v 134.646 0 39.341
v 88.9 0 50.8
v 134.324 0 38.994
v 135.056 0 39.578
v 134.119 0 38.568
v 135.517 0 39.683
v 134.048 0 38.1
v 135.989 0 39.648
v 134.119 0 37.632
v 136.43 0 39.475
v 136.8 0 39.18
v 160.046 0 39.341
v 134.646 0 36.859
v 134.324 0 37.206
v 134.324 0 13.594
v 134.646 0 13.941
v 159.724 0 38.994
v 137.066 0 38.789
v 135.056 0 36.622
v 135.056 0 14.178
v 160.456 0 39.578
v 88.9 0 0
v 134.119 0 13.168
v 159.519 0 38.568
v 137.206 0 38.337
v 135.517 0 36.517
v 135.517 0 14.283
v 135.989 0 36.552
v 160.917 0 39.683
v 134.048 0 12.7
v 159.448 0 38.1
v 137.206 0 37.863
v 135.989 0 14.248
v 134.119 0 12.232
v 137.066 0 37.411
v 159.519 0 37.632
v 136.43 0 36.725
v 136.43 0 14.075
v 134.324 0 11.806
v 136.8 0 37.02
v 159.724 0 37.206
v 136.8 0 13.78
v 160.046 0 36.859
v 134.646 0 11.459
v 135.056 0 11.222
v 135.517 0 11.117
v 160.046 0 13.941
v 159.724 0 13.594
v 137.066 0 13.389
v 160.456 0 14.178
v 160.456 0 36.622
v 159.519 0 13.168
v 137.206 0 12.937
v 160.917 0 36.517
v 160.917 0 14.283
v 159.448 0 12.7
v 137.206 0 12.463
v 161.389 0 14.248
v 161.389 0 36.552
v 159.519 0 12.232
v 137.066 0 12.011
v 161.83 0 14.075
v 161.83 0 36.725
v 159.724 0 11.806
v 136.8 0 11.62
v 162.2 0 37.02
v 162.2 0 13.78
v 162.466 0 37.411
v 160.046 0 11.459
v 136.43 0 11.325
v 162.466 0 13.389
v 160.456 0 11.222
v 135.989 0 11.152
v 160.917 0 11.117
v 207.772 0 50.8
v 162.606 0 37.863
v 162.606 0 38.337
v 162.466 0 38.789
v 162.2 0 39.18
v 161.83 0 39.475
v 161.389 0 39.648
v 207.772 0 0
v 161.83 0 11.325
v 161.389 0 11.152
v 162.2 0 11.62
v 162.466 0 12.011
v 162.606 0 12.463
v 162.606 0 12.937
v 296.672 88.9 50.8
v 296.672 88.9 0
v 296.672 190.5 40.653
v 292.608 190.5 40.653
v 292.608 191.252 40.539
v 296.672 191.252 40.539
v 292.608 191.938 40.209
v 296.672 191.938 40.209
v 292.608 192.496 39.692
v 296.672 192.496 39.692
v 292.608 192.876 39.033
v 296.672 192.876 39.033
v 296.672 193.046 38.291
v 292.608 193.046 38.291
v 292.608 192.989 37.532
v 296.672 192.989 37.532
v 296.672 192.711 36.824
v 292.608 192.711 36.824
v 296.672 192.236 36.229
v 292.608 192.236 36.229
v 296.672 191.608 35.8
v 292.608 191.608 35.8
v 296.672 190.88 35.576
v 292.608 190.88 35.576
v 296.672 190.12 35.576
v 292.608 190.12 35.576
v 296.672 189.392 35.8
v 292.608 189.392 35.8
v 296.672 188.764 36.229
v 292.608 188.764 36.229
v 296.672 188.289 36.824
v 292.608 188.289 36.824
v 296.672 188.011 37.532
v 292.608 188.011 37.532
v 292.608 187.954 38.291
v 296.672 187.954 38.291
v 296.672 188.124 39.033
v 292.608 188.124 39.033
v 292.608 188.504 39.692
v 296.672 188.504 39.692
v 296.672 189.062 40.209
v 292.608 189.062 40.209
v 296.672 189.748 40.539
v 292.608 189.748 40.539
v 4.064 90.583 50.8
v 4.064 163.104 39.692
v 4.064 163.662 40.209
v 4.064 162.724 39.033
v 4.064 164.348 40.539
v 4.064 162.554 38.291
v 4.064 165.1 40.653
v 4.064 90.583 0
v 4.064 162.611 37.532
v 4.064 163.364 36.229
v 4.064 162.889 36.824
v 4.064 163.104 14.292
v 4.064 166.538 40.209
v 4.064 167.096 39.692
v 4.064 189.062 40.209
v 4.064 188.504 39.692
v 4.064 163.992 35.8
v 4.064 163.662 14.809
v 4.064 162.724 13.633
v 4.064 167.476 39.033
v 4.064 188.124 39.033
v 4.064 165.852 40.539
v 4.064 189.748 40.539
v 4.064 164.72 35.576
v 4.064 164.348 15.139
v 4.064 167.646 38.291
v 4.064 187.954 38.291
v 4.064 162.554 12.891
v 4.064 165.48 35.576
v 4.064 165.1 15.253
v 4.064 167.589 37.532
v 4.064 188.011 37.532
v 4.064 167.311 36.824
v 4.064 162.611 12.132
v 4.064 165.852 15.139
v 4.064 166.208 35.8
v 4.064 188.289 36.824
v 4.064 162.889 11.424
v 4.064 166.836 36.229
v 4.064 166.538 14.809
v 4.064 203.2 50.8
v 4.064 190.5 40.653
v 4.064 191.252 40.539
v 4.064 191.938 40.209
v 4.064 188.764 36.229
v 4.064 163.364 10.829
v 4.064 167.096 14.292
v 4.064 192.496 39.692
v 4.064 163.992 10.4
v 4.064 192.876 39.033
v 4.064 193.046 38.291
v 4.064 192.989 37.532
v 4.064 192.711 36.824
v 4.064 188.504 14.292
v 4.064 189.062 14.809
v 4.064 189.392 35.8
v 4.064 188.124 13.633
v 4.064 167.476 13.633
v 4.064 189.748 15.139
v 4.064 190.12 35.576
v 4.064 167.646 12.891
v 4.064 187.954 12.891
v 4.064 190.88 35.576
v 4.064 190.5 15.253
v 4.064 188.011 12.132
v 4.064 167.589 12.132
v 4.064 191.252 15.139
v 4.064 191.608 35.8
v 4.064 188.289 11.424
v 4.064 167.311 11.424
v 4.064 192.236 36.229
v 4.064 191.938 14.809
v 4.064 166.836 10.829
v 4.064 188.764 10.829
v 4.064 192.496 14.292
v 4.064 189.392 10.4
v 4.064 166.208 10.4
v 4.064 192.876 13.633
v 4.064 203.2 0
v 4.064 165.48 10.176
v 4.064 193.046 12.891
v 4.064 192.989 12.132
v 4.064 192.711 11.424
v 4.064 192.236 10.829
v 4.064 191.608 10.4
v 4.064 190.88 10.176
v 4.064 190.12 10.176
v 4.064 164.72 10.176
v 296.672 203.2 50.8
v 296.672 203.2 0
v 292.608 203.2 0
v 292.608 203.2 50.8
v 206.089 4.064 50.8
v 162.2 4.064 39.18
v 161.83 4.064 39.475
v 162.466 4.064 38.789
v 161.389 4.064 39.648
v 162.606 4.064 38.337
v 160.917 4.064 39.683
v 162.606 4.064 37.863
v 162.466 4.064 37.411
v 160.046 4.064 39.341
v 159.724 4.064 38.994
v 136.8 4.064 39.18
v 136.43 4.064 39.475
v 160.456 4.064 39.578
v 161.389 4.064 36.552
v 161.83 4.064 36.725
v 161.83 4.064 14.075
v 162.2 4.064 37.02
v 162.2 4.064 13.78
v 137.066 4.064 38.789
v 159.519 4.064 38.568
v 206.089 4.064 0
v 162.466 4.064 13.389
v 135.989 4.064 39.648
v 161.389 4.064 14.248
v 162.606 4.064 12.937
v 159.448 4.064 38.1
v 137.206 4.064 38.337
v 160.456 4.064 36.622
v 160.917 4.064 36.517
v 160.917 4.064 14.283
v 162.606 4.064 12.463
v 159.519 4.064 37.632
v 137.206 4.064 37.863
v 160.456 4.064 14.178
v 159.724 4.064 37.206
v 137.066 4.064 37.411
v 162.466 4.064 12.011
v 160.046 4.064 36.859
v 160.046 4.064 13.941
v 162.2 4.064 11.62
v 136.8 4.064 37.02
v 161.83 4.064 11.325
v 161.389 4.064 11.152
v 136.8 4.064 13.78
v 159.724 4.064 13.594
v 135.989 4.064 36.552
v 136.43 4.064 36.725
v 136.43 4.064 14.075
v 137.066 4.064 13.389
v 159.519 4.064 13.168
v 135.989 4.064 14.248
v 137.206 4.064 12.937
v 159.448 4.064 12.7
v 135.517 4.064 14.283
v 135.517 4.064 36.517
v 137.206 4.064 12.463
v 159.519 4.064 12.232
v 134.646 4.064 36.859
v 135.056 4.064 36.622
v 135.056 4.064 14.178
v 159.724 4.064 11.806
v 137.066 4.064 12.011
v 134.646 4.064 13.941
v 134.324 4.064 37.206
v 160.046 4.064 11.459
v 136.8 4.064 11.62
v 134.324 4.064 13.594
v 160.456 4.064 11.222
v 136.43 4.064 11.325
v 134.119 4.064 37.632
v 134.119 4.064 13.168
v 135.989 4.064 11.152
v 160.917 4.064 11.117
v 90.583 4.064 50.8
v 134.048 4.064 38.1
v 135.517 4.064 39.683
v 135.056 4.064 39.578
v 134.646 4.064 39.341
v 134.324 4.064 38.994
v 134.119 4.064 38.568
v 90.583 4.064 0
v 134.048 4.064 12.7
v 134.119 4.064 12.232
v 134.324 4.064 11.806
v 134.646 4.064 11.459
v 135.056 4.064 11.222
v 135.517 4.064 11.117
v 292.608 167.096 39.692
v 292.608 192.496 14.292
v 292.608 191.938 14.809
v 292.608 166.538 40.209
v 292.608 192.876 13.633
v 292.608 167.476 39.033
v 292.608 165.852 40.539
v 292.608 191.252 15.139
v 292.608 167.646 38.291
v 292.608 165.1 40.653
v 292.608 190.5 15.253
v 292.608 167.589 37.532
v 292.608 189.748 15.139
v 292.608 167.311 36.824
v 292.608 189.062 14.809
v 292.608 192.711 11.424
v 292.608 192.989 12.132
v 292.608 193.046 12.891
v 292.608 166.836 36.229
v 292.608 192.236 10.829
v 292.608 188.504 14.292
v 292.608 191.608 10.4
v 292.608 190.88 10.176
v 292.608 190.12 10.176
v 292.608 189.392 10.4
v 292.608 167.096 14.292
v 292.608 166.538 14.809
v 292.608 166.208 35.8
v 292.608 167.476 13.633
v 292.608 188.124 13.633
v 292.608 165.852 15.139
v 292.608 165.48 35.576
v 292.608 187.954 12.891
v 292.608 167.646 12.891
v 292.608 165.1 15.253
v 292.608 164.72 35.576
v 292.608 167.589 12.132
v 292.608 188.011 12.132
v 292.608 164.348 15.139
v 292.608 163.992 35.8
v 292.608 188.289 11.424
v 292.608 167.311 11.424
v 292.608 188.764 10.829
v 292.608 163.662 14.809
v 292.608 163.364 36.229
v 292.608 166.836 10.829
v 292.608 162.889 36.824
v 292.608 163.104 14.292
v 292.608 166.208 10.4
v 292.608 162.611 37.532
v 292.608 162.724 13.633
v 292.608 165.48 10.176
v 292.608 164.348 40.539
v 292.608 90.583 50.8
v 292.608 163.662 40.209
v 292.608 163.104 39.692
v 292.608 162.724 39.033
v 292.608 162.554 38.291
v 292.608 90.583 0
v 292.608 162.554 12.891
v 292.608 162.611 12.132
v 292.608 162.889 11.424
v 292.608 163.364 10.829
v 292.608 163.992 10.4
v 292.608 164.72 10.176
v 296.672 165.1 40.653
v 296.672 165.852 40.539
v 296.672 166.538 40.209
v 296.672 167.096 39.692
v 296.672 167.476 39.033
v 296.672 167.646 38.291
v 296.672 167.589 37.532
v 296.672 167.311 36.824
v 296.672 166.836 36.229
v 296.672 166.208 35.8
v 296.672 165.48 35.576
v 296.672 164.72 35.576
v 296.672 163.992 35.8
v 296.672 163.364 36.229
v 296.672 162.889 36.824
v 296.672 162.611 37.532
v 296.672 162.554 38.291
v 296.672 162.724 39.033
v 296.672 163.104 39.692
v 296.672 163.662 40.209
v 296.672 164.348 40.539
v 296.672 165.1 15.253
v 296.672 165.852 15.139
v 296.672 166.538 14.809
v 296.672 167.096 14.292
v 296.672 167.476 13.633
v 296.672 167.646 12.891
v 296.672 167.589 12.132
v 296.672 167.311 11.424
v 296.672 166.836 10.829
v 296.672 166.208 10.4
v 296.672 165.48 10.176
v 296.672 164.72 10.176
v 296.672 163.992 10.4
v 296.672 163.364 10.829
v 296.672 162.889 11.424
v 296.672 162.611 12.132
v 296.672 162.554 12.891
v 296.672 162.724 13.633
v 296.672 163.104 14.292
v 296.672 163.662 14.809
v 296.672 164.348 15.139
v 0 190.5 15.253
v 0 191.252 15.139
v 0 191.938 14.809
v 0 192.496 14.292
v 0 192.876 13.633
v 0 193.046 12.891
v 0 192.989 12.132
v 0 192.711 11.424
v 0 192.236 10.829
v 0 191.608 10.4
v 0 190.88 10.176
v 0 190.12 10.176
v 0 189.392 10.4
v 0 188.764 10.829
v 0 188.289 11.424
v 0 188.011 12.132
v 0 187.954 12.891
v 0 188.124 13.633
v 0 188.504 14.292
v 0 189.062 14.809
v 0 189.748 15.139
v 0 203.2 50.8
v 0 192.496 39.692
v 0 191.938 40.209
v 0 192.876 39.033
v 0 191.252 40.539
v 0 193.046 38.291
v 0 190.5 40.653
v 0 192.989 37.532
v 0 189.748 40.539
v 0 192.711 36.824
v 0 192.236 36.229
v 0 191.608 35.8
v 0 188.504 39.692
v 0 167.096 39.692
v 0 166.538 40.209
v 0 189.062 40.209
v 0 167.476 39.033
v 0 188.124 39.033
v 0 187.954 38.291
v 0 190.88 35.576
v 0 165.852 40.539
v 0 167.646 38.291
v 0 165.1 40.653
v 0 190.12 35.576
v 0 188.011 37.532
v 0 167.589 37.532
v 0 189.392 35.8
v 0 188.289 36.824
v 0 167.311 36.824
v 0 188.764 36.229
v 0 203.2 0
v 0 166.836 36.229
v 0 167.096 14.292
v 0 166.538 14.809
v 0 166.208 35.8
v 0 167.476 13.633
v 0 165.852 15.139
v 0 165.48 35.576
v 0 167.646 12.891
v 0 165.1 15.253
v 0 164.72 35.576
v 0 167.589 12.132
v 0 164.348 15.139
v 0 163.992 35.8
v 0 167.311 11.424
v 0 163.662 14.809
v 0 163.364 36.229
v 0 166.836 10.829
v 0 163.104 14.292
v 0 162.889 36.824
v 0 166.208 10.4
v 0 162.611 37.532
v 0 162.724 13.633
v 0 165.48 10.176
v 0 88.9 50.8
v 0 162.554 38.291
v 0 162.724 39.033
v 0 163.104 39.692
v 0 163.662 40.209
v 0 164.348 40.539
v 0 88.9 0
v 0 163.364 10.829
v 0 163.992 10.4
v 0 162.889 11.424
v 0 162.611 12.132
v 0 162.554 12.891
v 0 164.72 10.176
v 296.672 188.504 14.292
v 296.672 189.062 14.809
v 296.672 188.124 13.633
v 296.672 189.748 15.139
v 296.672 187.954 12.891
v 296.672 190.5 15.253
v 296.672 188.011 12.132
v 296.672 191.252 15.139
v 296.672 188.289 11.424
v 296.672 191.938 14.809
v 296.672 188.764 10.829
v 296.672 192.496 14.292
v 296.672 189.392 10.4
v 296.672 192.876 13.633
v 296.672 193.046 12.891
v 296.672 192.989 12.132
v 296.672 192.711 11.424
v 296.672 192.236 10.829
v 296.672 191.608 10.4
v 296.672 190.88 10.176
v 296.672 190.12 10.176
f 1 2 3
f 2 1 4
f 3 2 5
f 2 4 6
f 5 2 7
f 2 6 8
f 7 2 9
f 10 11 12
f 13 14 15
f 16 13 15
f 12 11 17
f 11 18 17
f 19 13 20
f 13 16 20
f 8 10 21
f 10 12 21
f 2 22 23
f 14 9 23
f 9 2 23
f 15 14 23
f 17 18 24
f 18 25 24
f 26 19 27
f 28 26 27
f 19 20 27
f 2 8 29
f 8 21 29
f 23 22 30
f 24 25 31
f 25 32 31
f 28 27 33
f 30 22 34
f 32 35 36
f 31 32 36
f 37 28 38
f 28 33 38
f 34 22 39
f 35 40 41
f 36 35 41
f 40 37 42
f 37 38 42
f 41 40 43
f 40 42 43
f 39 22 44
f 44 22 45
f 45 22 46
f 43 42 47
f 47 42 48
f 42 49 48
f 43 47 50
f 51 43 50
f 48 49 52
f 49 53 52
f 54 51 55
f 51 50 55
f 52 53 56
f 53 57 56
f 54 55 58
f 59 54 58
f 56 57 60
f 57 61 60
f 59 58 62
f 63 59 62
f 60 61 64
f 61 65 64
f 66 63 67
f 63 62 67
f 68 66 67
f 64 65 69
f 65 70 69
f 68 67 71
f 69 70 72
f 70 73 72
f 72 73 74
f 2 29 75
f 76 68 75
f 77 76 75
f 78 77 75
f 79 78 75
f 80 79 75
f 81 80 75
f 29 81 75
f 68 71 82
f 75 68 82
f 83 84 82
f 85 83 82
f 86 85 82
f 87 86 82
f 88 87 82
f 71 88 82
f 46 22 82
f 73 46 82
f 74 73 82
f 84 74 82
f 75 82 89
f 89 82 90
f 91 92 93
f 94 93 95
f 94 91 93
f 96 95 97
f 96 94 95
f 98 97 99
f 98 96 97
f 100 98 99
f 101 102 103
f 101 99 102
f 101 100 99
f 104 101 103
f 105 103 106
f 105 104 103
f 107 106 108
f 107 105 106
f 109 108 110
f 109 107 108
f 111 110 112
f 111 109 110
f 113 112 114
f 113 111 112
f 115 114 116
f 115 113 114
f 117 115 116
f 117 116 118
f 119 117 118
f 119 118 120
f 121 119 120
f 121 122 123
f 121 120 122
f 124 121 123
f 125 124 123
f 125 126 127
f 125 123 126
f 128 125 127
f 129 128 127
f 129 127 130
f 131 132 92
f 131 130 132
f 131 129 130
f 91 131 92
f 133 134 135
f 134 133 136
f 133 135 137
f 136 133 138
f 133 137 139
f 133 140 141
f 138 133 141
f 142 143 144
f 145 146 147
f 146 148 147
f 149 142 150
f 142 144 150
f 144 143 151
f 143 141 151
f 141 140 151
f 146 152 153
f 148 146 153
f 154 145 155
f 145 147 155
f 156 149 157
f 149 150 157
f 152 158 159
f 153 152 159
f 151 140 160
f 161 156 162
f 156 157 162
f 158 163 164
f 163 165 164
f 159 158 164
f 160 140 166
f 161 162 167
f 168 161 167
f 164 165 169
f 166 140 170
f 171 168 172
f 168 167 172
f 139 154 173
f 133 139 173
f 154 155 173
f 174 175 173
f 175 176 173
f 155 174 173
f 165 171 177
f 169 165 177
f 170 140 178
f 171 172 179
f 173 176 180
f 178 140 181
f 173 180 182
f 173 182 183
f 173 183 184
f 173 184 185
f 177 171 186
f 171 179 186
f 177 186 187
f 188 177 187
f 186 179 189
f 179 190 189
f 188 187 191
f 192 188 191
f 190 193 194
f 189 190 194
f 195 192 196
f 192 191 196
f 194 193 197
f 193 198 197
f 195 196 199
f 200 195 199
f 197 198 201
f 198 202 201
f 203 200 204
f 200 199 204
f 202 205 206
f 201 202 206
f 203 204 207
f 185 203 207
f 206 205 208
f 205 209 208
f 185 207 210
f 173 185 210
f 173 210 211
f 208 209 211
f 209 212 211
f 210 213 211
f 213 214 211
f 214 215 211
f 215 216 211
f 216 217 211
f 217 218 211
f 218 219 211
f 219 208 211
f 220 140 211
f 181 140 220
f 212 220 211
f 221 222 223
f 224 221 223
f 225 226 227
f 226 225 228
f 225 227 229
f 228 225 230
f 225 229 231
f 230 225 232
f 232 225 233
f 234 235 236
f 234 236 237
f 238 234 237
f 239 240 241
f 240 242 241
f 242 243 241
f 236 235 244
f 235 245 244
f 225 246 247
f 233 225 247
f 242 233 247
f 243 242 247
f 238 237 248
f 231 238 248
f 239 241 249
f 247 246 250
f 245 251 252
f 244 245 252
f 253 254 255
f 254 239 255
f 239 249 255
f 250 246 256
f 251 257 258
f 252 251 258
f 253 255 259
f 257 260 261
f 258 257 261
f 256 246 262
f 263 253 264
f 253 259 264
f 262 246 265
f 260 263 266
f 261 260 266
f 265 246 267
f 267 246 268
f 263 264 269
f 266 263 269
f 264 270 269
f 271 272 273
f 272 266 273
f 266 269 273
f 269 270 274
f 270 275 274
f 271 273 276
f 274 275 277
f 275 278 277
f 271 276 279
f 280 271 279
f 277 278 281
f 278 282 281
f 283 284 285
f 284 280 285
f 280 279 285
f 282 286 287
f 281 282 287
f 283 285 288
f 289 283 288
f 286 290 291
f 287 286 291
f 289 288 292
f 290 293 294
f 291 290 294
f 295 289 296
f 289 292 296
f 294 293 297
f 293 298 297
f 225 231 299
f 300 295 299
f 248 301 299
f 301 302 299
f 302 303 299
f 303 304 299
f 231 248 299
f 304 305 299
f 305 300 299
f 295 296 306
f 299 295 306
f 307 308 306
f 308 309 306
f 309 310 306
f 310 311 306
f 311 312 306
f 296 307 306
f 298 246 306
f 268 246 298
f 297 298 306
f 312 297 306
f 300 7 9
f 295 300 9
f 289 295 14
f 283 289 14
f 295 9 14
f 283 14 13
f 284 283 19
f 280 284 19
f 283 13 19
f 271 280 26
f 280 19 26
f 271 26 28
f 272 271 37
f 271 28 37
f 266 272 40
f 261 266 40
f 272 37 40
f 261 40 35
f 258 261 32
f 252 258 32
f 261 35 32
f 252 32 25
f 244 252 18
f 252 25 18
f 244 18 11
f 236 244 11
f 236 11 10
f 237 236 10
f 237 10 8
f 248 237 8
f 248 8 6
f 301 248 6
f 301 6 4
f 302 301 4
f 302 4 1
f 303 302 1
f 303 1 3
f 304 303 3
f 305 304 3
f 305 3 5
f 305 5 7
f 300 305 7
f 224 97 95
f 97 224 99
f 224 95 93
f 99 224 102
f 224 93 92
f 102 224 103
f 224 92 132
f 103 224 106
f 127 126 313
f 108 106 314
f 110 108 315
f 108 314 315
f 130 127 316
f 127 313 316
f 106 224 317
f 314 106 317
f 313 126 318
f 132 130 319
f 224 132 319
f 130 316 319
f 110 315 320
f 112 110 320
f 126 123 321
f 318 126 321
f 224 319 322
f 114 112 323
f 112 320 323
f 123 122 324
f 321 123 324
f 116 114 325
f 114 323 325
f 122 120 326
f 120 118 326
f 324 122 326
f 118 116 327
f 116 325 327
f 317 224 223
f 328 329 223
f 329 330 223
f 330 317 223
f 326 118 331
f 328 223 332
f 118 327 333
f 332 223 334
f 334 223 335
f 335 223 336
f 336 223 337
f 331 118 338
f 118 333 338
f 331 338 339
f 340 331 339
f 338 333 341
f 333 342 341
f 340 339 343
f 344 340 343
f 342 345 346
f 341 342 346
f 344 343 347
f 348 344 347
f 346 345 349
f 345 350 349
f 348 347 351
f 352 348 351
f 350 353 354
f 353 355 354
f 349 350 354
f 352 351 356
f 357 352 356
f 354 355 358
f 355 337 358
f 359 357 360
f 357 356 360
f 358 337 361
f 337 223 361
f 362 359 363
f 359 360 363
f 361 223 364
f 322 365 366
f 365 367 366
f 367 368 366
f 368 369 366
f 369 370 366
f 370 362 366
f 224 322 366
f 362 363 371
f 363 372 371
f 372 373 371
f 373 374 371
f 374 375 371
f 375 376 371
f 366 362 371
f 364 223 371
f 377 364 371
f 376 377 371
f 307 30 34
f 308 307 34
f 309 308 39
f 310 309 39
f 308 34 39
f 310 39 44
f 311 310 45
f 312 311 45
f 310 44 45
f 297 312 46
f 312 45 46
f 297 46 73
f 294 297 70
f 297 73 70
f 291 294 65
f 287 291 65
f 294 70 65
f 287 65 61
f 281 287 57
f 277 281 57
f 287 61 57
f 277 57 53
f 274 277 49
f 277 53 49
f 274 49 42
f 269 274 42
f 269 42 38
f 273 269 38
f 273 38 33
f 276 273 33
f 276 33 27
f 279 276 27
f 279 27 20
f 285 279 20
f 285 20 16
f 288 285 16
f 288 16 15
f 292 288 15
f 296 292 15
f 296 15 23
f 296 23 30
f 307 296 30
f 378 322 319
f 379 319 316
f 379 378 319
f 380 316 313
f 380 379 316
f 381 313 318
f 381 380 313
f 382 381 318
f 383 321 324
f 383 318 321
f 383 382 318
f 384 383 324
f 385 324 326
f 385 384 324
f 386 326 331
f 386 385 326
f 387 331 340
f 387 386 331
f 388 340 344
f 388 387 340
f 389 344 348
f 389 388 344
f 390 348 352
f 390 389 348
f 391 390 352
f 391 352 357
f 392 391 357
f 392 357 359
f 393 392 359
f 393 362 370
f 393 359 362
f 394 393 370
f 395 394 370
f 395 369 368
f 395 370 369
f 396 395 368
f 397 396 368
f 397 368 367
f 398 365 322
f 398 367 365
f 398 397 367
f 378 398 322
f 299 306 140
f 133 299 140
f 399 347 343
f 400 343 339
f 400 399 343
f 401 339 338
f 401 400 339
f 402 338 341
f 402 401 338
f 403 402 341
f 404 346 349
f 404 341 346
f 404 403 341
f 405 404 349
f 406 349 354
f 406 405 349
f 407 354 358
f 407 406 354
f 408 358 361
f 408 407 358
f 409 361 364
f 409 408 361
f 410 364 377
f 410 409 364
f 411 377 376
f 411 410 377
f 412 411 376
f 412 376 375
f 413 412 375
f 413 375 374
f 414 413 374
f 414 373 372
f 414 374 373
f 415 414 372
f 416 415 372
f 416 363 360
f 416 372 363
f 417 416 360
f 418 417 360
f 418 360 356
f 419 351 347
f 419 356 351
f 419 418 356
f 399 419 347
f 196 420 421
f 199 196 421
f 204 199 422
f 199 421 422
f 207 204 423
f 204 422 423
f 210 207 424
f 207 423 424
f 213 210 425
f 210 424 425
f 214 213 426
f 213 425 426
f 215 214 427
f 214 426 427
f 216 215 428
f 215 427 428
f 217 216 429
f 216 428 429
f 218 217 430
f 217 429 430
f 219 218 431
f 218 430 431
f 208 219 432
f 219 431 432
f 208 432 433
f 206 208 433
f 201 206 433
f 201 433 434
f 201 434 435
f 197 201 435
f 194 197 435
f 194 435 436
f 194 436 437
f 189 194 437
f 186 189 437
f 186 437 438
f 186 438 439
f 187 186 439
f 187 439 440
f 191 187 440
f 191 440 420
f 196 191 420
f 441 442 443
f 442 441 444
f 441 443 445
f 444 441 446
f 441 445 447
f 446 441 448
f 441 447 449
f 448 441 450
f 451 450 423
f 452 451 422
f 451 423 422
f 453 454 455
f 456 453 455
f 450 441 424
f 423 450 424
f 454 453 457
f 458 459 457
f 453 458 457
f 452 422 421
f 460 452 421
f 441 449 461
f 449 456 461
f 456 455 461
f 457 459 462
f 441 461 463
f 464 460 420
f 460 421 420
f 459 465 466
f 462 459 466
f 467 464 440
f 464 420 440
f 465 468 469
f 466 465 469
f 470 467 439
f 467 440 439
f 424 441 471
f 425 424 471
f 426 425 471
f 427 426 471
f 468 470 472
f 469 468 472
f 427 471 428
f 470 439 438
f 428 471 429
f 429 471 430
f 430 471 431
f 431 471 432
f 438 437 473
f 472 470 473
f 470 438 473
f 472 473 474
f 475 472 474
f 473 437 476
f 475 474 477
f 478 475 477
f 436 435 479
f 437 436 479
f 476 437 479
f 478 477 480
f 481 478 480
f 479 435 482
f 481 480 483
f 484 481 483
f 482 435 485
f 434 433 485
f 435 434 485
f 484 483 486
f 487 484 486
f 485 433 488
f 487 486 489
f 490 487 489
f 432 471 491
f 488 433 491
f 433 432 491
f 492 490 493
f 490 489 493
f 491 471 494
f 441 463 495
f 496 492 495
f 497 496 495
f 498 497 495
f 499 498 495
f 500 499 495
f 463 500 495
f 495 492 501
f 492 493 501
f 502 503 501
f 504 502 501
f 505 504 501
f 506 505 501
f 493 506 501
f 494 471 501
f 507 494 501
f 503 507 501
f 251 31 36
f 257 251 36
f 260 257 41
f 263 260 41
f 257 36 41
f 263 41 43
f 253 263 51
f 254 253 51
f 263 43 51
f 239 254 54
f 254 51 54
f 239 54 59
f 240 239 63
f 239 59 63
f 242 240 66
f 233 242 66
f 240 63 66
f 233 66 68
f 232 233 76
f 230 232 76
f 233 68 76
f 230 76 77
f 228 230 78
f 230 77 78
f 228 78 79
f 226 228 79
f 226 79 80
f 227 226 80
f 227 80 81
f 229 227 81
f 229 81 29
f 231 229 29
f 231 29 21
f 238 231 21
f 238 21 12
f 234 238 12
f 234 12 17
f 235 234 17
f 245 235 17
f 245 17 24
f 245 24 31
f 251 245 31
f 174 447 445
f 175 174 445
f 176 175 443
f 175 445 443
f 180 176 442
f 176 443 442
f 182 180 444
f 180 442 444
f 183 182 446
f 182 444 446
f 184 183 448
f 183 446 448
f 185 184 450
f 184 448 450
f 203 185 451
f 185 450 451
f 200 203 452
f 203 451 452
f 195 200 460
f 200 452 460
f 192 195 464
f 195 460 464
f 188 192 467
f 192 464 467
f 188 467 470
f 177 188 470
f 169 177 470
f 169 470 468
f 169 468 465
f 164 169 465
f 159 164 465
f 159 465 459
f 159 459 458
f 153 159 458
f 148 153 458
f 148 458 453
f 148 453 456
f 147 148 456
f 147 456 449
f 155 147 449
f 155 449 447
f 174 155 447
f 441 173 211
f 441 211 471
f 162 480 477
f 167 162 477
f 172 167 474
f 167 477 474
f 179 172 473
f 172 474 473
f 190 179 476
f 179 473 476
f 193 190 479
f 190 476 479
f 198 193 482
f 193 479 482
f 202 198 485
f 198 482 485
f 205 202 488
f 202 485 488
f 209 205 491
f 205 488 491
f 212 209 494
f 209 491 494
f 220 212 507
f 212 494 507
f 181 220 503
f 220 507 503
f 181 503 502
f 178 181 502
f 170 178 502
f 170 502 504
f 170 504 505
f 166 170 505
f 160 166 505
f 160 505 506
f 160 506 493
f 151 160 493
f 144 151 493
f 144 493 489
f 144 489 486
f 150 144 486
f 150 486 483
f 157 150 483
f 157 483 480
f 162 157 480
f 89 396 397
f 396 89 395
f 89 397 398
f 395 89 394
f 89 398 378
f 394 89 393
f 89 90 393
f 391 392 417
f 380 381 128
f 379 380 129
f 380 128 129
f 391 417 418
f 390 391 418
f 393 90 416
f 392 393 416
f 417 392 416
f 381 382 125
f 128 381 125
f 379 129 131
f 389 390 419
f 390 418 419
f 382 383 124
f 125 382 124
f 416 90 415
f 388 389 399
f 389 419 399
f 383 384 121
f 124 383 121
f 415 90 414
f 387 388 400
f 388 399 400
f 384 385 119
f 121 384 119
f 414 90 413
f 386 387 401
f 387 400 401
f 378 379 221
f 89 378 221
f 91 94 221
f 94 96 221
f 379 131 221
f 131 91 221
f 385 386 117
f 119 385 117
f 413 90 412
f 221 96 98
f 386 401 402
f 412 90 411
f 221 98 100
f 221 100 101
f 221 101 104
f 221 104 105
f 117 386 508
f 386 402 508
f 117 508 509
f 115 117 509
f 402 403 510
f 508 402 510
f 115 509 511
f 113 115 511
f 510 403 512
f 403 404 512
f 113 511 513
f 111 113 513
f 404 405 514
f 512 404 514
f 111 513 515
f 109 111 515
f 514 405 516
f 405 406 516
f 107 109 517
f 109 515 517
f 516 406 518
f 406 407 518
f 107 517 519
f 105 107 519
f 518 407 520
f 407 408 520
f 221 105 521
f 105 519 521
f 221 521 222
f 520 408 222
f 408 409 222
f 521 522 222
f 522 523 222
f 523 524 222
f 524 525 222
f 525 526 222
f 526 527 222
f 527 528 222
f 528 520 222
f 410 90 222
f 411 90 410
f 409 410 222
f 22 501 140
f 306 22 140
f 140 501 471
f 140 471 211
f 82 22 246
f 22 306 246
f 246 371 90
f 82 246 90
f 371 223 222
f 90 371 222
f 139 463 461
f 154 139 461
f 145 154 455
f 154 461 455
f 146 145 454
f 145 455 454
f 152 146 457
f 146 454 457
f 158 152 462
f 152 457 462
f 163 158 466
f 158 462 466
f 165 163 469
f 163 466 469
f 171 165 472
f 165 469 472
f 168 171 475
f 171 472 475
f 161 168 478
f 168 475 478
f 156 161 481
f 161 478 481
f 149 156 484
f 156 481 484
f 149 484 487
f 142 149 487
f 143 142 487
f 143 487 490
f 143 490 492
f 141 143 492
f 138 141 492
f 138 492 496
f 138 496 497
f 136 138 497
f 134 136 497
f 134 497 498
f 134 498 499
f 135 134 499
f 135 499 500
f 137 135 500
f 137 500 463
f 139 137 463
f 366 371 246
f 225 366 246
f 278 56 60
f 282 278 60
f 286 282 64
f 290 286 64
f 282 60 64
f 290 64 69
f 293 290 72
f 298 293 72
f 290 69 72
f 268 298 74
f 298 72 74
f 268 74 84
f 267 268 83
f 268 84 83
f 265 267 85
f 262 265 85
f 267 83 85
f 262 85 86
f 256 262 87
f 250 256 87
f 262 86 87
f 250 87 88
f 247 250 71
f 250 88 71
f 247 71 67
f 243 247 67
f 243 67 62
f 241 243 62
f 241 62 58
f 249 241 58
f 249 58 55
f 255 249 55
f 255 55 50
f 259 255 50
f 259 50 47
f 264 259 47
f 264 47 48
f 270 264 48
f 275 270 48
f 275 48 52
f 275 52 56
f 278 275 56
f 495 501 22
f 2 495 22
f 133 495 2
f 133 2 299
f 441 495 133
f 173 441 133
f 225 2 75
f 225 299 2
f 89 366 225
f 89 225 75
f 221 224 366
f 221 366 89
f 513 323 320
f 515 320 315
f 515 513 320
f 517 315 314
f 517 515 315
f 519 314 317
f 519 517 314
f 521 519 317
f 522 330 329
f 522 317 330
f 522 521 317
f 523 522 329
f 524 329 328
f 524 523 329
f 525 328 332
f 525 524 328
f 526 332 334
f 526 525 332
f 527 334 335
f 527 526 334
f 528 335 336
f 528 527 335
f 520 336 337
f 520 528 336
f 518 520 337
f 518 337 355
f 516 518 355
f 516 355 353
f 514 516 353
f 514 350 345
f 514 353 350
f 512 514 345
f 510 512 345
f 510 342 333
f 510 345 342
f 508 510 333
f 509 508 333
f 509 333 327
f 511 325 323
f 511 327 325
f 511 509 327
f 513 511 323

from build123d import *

# Parameters (mm, degrees)
BOSS_EXTRUDE2_DEPTH          = 50.8
F_10_CLEARANCE_HOLE1_D       = 5.1054
F_10_CLEARANCE_HOLE1_DEPTH   = 4.064
F_1_8_0_125_DIAMETER_HOLE1_D = 3.175


with BuildPart() as part:
    # Sketch1 → Boss-Extrude2 (new body)
    with BuildSketch(Plane.XY):
        Polygon((0, 203.2), (0, 88.9), (88.9, 0), (207.772, 0), (296.672, 88.9), (296.672, 203.2), (292.608, 203.2), (292.608, 90.583363917), (206.088636083, 4.064), (90.583363917, 4.064), (4.064, 90.583363917), (4.064, 203.2), align=None)
    extrude(amount=BOSS_EXTRUDE2_DEPTH)

    # #10 Clearance Hole1
    with Locations(Plane(origin=(4.064, 0, 0), x_dir=(0, 0, -1), z_dir=(1, 0, 0))):
        with Locations((-38.1, 190.5), (-12.7, 165.1), (-38.1, 165.1), (-12.7, 190.5)):
            f_10_clearance_hole1 = Hole(F_10_CLEARANCE_HOLE1_D / 2, depth=F_10_CLEARANCE_HOLE1_DEPTH)

    # Mirror1: #10 Clearance Hole1 across plane
    add(f_10_clearance_hole1.mirror(Plane(origin=(148.336, 0, 0), x_dir=(0, 0, 1), z_dir=(1, 0, 0))), mode=Mode.SUBTRACT)

    # 1/8 (0.125) Diameter Hole1 (through all)
    with Locations(Plane(origin=(0, 4.064, 0), x_dir=(1, 0, 0), z_dir=(0, 1, 0))):
        with Locations((135.636, -38.1), (161.036, -12.7), (135.636, -12.7), (161.036, -38.1)):
            Hole(F_1_8_0_125_DIAMETER_HOLE1_D / 2)


solid = part.part
